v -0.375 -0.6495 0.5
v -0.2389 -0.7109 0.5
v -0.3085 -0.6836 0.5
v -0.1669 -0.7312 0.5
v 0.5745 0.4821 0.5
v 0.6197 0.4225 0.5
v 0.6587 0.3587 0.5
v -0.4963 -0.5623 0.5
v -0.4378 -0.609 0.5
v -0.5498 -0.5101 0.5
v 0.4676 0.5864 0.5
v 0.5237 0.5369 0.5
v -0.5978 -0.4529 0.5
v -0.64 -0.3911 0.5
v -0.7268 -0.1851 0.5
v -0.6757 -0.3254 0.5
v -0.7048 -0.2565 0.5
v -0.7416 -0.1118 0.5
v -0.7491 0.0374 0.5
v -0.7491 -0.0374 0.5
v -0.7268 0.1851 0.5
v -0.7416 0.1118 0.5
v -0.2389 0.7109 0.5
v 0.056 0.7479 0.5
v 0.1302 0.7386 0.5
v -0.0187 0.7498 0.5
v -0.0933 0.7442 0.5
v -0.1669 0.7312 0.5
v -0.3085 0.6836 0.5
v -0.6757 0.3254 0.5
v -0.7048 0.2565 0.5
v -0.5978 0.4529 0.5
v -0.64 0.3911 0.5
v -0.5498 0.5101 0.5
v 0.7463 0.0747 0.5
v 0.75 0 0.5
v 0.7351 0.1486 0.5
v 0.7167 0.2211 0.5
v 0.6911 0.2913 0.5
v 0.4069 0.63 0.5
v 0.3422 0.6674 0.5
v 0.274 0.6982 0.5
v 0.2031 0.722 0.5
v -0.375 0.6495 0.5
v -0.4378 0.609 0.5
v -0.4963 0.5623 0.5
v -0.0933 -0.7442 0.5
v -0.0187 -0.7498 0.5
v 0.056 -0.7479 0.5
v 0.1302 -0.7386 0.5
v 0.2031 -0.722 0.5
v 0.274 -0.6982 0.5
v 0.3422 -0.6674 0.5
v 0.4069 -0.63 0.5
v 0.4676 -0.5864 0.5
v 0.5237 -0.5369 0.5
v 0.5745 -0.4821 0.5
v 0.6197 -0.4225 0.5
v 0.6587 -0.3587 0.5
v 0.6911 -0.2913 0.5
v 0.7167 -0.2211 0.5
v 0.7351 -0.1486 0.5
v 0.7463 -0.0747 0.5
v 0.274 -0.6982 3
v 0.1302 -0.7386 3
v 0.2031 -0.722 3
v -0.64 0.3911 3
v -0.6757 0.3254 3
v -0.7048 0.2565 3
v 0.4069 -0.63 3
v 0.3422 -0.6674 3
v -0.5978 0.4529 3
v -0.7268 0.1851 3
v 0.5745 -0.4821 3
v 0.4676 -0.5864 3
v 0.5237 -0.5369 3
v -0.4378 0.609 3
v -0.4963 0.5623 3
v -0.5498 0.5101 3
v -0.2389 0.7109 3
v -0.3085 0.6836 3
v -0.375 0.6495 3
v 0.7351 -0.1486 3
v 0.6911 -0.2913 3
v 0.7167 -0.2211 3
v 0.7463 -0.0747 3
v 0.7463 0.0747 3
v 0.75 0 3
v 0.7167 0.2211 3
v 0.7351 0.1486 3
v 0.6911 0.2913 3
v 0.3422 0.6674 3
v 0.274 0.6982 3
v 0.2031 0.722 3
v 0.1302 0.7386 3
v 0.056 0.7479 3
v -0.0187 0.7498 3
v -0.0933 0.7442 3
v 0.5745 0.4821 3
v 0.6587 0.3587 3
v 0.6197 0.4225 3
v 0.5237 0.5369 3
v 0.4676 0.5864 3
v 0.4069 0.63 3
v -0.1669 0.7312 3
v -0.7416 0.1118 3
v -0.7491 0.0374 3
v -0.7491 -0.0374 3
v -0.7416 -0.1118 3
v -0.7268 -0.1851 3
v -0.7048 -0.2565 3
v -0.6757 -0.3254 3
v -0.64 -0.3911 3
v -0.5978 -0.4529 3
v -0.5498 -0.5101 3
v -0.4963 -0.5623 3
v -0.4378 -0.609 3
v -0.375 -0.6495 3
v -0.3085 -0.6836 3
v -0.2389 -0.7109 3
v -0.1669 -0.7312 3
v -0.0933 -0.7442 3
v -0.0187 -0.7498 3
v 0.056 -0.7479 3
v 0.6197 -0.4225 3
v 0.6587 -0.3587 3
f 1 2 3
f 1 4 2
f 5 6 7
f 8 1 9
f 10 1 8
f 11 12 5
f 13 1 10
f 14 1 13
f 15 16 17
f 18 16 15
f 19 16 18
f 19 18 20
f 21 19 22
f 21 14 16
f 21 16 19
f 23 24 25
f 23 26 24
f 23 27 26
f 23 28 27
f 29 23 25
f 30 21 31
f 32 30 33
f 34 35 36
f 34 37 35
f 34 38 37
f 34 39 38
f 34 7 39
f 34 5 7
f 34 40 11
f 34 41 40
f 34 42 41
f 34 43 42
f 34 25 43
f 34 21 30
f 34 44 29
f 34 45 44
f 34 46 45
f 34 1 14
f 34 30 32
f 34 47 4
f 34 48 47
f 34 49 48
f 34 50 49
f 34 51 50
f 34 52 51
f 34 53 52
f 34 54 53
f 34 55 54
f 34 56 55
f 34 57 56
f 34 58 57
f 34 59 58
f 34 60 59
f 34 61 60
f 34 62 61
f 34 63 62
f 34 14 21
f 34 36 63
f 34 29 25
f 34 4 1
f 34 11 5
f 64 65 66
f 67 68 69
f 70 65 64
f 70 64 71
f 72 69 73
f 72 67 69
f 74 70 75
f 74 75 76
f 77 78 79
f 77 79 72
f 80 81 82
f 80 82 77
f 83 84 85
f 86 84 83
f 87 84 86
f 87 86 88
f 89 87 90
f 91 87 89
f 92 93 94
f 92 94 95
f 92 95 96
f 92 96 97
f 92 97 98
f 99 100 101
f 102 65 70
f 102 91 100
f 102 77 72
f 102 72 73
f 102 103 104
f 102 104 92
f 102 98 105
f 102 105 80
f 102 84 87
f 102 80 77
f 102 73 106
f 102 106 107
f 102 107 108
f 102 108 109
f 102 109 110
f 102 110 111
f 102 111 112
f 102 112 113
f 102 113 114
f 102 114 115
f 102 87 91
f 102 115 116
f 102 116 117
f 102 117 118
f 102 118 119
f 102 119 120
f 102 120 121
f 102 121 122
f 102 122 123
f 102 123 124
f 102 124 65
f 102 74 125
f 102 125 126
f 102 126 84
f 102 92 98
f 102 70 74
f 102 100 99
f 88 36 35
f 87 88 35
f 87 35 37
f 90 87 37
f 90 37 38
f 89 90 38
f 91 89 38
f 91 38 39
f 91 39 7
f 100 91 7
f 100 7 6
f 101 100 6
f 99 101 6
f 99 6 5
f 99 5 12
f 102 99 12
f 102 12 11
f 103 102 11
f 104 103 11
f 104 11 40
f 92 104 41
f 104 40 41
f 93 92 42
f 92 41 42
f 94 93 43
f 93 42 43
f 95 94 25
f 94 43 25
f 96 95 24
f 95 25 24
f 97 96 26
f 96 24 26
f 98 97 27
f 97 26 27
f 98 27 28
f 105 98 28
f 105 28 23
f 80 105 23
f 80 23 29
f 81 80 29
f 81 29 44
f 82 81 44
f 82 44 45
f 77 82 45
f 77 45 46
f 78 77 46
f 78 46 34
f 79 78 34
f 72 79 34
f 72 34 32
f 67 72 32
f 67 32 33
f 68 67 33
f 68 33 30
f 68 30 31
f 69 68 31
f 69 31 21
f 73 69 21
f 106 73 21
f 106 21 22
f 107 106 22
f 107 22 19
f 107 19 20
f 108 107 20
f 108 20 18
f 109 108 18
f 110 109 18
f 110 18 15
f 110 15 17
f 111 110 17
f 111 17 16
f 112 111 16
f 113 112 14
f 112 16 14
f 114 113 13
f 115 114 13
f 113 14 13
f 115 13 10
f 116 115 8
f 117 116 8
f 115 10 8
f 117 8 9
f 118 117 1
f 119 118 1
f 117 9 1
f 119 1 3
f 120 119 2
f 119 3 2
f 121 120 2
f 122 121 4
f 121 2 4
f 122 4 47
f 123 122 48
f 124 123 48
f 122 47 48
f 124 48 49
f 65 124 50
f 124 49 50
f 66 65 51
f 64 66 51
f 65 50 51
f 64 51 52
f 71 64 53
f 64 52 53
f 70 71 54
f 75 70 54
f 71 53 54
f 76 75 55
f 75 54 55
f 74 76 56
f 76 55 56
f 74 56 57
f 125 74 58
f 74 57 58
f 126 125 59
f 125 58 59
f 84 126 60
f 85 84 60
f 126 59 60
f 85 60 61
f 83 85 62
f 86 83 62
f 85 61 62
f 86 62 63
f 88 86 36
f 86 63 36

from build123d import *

# Parameters (mm, degrees)
SKETCH1_R           = 0.75
BOSS_EXTRUDE1_DEPTH = 3
BOSS_EXTRUDE2_START = 1
SKETCH2_R           = 0.75
BOSS_EXTRUDE2_DEPTH = 1
BOSS_EXTRUDE3_START = 1
SKETCH3_R           = 0.75
BOSS_EXTRUDE3_DEPTH = 1
SKETCH4_R           = 0.75
CUT_EXTRUDE1_DEPTH  = 2.5


with BuildPart() as part:
    # Sketch1 → Boss-Extrude1 (new body)
    with BuildSketch(Plane.XY):
        Circle(SKETCH1_R)
    extrude(amount=BOSS_EXTRUDE1_DEPTH)

    # Sketch2 → Boss-Extrude2 (add)
    with BuildSketch(Plane(origin=(0, 0, 0), x_dir=(-1, 0, 0), z_dir=(0, 0, -1)).offset(BOSS_EXTRUDE2_START)):
        Circle(SKETCH2_R)
    extrude(amount=-BOSS_EXTRUDE2_DEPTH)

    # Sketch3 → Boss-Extrude3 (add)
    with BuildSketch(Plane(origin=(0, 0, -1), x_dir=(-1, 0, 0), z_dir=(0, 0, -1)).offset(BOSS_EXTRUDE3_START)):
        Circle(SKETCH3_R)
    extrude(amount=-BOSS_EXTRUDE3_DEPTH)

    # Sketch4 → Cut-Extrude1 (cut)
    with BuildSketch(Plane(origin=(0, 0, -2), x_dir=(-1, 0, 0), z_dir=(0, 0, -1))):
        Circle(SKETCH4_R)
    extrude(amount=-CUT_EXTRUDE1_DEPTH, mode=Mode.SUBTRACT)


solid = part.part
